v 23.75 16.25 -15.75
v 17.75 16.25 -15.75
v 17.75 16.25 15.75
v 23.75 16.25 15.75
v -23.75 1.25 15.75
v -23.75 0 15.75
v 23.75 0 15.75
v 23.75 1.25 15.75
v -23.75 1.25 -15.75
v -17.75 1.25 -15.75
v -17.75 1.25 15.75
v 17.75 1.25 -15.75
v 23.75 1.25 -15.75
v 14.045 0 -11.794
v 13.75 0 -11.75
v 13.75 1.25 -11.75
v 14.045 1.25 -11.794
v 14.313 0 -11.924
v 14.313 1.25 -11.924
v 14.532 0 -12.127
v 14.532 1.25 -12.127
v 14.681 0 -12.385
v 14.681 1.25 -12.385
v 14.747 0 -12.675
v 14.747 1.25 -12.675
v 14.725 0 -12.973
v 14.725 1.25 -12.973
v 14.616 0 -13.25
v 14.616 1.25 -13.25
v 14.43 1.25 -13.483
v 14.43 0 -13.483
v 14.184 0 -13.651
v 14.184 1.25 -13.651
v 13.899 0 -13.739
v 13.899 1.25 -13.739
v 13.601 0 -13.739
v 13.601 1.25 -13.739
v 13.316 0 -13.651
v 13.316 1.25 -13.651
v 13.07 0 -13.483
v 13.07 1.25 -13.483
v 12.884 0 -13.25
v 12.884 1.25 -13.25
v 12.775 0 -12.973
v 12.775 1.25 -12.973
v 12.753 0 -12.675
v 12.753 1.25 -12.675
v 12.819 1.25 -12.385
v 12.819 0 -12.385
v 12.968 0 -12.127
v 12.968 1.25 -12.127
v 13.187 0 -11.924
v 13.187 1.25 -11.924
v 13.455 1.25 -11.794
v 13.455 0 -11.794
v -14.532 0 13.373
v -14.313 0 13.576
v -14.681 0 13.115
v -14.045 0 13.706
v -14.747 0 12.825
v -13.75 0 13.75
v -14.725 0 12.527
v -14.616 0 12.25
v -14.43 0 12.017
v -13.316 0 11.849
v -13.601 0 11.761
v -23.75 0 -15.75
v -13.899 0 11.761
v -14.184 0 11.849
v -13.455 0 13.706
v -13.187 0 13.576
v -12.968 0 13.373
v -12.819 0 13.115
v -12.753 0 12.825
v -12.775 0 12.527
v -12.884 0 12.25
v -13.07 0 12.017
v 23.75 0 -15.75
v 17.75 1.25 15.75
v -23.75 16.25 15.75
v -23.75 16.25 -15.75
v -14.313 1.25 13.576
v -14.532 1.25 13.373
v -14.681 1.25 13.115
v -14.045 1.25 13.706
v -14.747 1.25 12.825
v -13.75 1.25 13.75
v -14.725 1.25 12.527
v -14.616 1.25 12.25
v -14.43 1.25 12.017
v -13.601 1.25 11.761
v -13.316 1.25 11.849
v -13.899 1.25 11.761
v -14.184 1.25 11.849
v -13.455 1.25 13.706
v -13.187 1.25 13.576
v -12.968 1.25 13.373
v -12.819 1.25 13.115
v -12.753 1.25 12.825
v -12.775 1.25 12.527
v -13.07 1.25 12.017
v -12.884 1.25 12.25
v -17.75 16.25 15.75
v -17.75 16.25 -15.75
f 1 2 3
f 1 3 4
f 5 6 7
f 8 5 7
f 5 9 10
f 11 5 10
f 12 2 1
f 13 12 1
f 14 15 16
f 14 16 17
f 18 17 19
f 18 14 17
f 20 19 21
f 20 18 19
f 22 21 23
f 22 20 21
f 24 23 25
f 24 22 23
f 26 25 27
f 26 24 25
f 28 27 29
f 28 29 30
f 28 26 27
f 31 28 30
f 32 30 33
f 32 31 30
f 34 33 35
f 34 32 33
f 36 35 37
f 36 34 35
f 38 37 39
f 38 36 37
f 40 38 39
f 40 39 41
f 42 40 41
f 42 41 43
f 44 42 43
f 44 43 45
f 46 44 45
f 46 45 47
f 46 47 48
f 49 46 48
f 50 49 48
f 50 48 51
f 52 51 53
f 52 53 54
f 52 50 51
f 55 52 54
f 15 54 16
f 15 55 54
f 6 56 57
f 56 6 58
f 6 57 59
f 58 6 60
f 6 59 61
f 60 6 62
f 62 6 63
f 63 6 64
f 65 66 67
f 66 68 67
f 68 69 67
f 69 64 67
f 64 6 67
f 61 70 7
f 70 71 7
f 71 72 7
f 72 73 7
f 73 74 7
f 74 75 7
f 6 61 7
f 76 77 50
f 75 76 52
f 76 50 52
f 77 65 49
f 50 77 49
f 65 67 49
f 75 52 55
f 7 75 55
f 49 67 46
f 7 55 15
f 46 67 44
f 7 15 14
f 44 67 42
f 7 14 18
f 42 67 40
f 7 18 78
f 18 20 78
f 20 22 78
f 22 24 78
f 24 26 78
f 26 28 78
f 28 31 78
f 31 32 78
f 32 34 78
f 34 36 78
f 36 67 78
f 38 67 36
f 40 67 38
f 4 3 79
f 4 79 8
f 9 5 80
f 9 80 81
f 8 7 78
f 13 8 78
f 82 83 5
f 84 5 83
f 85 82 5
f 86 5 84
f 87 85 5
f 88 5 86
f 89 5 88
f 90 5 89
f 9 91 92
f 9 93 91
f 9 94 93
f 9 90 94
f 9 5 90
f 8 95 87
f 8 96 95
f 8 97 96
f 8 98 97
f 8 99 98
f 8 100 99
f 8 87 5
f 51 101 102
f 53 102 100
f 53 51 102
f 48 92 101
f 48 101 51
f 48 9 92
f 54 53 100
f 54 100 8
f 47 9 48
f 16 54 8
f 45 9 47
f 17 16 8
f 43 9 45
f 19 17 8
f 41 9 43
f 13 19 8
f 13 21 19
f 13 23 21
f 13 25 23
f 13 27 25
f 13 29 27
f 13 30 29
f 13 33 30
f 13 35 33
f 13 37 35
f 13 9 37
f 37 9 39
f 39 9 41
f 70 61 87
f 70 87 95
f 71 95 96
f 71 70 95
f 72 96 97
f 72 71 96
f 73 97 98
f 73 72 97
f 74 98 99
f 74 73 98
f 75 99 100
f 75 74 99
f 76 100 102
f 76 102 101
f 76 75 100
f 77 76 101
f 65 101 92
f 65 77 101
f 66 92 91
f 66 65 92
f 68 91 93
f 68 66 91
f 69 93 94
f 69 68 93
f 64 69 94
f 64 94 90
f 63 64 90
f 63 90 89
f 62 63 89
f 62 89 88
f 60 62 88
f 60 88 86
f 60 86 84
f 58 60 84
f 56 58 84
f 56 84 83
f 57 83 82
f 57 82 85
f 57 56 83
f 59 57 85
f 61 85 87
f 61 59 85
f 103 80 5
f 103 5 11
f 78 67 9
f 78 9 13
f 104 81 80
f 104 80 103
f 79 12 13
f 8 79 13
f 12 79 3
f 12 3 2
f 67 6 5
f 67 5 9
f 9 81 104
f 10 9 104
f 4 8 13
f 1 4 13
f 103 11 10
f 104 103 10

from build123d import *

# Parameters (mm, degrees)
SKETCH1_W             = 47.5
SKETCH1_H             = 31.5
SKETCH1_R             = 1
BOSS_EXTRUDE1_DEPTH   = 1.25
SKETCH2_W             = 6
SKETCH2_H             = 31.5
BOSS_EXTRUDE2_DEPTH   = 15
BOSS_EXTRUDE2_2_DEPTH = 15


with BuildPart() as part:
    # Sketch1 → Boss-Extrude1 (new body)
    with BuildSketch(Plane(origin=(0, 0, 0), x_dir=(1, 0, 0), z_dir=(0, 1, 0))):
        Rectangle(SKETCH1_W, SKETCH1_H)
        with Locations(Location((13.75, 12.75, 0), (0, 0, 270))):
            Circle(SKETCH1_R, mode=Mode.SUBTRACT)
        with Locations(Location((-13.75, -12.75, 0), (0, 0, 270))):
            Circle(SKETCH1_R, mode=Mode.SUBTRACT)
    extrude(amount=BOSS_EXTRUDE1_DEPTH)


with BuildPart() as body_2:
    # Sketch2 → Boss-Extrude2 (new body)
    with BuildSketch(Plane(origin=(0, 1.25, 0), x_dir=(1, 0, 0), z_dir=(0, 1, 0))):
        with Locations((-20.75, 0)):
            Rectangle(SKETCH2_W, SKETCH2_H)
    extrude(amount=BOSS_EXTRUDE2_DEPTH)


with BuildPart() as body_3:
    # Sketch2 → Boss-Extrude2 2 (new body)
    with BuildSketch(Plane(origin=(0, 1.25, 0), x_dir=(1, 0, 0), z_dir=(0, 1, 0))):
        with Locations((20.75, 0)):
            Rectangle(SKETCH2_W, SKETCH2_H)
    extrude(amount=BOSS_EXTRUDE2_2_DEPTH)


solid = Compound([part.part, body_2.part, body_3.part])
